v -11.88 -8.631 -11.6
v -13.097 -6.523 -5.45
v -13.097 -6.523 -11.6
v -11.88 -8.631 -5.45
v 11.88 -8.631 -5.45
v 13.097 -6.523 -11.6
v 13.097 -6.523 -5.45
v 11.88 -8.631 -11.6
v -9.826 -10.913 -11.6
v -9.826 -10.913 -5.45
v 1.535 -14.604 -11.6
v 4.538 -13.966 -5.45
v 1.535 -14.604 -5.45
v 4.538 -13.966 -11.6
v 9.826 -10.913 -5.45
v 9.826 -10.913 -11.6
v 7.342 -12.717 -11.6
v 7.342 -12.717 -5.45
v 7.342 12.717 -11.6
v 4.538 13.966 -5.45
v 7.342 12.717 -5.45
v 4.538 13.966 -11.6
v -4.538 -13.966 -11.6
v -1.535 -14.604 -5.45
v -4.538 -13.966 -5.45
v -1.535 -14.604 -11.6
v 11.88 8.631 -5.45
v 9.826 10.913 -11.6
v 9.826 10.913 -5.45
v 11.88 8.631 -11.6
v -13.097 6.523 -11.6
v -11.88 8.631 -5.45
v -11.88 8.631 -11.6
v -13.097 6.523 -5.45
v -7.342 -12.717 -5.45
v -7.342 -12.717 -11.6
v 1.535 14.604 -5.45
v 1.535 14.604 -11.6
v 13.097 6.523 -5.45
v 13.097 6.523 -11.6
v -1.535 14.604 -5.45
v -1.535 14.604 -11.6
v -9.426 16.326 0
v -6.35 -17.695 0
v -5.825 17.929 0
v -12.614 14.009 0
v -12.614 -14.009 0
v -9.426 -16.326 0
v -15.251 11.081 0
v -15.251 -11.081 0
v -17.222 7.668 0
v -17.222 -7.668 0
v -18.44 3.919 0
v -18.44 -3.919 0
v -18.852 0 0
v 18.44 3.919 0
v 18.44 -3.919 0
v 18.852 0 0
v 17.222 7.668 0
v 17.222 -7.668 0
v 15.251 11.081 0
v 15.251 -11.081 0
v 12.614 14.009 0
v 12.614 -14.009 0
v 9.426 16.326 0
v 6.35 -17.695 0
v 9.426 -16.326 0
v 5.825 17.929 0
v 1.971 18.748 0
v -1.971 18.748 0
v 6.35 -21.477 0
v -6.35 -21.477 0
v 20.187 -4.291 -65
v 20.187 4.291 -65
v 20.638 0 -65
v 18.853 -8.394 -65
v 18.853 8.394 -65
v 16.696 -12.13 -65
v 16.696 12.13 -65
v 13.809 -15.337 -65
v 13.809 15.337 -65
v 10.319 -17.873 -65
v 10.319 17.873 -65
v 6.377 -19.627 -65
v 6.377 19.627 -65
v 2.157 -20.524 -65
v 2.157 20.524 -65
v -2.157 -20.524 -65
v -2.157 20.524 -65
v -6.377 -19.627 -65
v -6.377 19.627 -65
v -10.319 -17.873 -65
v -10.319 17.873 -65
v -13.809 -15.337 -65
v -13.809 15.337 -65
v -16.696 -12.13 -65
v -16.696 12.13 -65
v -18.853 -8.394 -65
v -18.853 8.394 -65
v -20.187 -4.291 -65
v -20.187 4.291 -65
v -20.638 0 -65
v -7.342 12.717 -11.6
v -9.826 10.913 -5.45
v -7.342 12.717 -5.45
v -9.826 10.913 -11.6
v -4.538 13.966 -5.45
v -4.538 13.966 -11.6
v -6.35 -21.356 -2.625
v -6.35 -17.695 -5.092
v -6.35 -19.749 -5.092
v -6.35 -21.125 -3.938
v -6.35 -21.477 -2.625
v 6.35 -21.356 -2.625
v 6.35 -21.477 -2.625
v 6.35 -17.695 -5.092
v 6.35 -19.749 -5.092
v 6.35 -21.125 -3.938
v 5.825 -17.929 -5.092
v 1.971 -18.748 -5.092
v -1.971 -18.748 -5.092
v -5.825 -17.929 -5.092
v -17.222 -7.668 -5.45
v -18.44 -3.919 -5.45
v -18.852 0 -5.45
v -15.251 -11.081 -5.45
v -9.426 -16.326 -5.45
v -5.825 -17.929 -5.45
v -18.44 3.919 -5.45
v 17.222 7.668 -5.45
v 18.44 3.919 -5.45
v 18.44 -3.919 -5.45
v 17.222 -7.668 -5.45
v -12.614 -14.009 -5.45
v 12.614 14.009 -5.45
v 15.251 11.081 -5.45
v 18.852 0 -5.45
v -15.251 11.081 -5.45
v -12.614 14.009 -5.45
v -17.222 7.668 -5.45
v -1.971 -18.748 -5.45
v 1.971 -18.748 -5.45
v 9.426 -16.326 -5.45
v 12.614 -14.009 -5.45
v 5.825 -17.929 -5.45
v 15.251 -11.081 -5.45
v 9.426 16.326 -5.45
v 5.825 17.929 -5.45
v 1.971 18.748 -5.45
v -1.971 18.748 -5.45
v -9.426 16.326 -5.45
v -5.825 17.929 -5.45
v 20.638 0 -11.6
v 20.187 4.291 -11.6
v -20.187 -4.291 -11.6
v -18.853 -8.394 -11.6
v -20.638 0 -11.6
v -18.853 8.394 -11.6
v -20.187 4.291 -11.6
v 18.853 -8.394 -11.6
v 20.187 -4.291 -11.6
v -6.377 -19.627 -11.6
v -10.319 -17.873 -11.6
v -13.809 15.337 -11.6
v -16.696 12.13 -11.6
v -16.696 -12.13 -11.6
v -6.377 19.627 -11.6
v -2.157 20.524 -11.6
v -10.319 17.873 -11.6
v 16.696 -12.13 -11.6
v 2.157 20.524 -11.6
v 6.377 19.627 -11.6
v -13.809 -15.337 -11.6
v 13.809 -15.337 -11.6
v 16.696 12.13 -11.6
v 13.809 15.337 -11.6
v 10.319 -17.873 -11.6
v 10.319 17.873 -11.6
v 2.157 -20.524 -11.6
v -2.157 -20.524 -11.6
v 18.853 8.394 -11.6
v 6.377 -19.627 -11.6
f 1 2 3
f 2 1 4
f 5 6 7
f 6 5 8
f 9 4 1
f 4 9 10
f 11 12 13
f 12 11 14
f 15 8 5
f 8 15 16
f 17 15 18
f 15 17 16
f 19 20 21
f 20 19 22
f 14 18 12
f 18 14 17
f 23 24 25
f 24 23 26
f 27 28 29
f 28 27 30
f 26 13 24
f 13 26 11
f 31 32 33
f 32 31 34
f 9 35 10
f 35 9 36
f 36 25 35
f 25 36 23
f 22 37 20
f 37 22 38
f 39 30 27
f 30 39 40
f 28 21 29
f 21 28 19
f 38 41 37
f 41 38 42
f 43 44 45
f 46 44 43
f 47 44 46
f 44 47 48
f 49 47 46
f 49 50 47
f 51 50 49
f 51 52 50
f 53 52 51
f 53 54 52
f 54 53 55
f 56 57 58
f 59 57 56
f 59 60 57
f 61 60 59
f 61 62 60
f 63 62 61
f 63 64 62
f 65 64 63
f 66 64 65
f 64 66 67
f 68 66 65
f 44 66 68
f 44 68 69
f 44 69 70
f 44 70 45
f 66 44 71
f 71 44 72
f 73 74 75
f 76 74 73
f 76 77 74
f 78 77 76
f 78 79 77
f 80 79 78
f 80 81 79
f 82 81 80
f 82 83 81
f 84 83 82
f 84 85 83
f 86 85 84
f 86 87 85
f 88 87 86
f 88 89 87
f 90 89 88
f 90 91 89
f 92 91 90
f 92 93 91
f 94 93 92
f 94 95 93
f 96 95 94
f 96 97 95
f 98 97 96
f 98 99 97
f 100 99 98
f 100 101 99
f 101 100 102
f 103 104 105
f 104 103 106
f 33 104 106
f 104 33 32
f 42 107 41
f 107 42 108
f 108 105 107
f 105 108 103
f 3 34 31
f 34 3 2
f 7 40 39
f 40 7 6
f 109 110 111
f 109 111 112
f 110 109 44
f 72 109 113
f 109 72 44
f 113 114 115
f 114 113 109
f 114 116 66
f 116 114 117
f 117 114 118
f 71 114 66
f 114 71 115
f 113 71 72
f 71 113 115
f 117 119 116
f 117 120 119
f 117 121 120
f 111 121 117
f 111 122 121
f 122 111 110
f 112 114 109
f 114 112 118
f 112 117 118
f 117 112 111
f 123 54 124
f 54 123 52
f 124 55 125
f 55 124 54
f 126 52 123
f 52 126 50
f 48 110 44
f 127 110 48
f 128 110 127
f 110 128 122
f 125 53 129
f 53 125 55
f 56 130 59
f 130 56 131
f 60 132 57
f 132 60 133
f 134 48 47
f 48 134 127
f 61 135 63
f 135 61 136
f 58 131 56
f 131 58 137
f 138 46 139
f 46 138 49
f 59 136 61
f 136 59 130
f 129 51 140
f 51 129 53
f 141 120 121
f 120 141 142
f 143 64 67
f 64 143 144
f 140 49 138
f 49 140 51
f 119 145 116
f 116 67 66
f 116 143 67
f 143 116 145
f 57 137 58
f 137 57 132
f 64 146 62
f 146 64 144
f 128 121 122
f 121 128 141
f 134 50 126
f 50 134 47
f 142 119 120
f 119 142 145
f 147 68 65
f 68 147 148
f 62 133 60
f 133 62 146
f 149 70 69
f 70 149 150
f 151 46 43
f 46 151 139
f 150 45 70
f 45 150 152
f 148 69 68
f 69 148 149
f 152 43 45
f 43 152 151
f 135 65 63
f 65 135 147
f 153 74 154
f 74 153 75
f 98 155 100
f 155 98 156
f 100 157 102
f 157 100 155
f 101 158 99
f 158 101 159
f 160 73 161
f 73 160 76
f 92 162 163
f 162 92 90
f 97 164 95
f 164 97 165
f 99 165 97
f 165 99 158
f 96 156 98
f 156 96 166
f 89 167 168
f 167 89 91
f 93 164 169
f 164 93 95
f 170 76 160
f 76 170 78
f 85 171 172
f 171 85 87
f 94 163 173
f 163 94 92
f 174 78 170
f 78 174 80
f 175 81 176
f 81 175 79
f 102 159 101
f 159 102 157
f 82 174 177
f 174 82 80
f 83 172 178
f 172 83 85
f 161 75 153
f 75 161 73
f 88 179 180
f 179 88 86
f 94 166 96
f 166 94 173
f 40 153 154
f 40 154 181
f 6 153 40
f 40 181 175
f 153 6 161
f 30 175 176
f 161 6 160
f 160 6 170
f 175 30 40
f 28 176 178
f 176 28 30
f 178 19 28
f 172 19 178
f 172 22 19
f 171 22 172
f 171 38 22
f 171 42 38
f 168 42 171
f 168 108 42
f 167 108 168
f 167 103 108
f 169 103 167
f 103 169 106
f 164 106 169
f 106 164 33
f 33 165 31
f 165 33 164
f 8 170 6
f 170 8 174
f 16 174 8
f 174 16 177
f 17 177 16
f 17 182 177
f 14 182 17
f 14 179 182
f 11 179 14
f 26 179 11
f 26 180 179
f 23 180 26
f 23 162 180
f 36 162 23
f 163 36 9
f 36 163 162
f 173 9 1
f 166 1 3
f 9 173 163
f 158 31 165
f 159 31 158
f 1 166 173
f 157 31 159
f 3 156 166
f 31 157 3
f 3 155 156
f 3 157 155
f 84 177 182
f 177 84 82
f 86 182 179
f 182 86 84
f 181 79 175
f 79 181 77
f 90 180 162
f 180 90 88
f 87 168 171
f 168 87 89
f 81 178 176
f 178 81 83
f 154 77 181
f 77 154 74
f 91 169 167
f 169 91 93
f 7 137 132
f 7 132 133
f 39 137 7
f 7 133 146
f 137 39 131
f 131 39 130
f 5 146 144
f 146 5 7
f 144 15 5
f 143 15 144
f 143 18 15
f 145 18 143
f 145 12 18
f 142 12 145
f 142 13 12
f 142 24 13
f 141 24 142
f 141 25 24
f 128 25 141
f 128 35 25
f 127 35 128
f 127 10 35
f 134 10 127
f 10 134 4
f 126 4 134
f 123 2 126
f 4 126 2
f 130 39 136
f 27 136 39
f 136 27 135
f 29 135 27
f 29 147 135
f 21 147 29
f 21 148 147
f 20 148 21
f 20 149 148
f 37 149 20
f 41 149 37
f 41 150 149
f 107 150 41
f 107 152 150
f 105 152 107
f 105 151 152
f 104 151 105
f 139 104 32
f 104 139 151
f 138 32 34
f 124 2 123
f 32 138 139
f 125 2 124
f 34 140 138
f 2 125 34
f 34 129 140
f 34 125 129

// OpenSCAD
squarewidth=25.4*(1+1/32);
rounddia=25.4*(1+5/32);
height=65;
discdia=25.4*(1+31/64);
discheight=5.25;
discthickness=25.4*(1/4);
flaphingewidth=25.4*(1/2);
nutdia=25.4*(1+5/8);
protect=9;
pad=.4;
hpad=.2;

module power(solid=false,r=4,sliceat=17,support=false) {
    mirror([0,0,1]) 
    if (!solid) {
        rotate(180) {
            translate([0,0,discheight]) cylinder(d=discdia,h=hpad);
            translate([0,0,discheight+discthickness]) cylinder(d=nutdia,h=hpad);
            //translate([0,0,height]) cylinder(d=nutdia,h=hpad);
            difference() {
                union() {
                        translate([0,discdia/2+discheight/4,discheight/4]) cube([flaphingewidth,discheight/2,discheight/2],true); 
                    translate([0,0,discheight/2])rotate([0,90,0]) hull() { 
                        translate([0,discdia/2,0]) cylinder(d=discheight,h=flaphingewidth,center=true); 
                        
                        cylinder(d=discheight,h=flaphingewidth,center=true);}
                    cylinder(d=discdia,h=discheight);
                    intersection() {
                        cylinder(d=rounddia,h=height);
                        translate([-squarewidth/2,-(rounddia+1)/2,0]) cube([squarewidth,rounddia+1,height]);
                    }
                    translate([0,0,discheight+discthickness]) cylinder(d=nutdia,h=height-discheight-discthickness);
                }
                if (support) {
                    difference() {
                        translate([0,0,-pad/2]) intersection() {
                            cylinder(d=rounddia+2*pad,h=height+pad);
                            translate([-squarewidth/2-pad,-(rounddia+1)/2-pad,0]) cube([squarewidth+2*pad,rounddia+1+2*pad,height+pad]);
                        }
                        translate([0,0,-pad]) intersection() {
                            cylinder(d=rounddia,h=height+2*pad);
                            translate([-squarewidth/2,-(rounddia+1)/2,0]) cube([squarewidth,rounddia+1,height+2*pad]);
                        }
                    }
                }
            }
        }
    } else {
        translate([0,0,r+0.001]) cylinder(d1=nutdia+protect*2-r,d2=nutdia+protect*1-r,h=height+2.999-2*r);
       
    }
}
function powerr(r) = nutdia+protect*2-r;
function powerh(r) = height+2.999-2*r;
difference() { 
    power(true); 
    !power(false);
}
